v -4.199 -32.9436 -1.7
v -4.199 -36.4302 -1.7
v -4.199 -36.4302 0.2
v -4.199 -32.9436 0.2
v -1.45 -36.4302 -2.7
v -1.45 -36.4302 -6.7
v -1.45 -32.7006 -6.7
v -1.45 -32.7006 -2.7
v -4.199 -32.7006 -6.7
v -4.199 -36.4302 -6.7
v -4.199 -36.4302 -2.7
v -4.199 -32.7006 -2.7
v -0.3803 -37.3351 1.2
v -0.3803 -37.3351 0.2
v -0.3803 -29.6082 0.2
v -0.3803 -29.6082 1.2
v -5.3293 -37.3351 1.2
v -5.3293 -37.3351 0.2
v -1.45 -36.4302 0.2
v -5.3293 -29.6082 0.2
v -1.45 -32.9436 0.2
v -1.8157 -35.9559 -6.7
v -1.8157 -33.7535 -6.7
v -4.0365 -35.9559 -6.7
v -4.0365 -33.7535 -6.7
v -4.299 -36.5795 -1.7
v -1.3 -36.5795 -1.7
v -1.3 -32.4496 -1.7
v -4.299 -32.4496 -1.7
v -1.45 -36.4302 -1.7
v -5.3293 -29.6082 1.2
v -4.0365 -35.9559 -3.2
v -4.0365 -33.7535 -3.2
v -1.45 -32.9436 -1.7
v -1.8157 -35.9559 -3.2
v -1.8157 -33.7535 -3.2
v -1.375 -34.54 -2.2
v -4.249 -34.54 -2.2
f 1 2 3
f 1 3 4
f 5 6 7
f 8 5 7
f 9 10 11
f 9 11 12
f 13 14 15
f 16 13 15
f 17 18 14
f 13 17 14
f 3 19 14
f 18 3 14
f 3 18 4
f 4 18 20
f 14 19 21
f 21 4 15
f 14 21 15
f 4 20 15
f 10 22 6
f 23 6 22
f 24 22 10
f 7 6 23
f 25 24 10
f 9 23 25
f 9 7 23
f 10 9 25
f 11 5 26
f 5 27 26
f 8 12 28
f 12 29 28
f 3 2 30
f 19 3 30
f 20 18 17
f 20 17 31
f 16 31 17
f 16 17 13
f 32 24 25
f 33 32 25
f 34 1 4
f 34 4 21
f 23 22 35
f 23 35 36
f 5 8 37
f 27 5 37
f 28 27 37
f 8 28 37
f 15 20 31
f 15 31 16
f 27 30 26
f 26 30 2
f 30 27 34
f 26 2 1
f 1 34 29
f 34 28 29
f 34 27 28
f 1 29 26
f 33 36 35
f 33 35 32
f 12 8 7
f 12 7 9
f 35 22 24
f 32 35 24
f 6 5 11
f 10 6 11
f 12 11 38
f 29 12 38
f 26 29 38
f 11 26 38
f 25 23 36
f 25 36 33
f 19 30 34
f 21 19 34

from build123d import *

# Parameters (mm, degrees)
EXTRUDE_1_DEPTH      = 0.2
EXTRUDE_1_DEPTH_BACK = 1.7
SKETCH_2_W           = 2.749
SKETCH_2_H           = 3.486646178
SKETCH_3_W           = 4.948986656
SKETCH_3_H           = 7.726872963
EXTRUDE_2_DEPTH      = 1
SKETCH_8_W           = 2.749
SKETCH_8_H           = 3.729608675
EXTRUDE_3_DEPTH      = 4
SKETCH_9_W           = 2.220876602
SKETCH_9_H           = 2.202369297
CUT_EXTRUDE_1_DEPTH  = 3.5


with BuildPart() as part:
    # 草图2 → 凸台-拉伸1 (new, two sides: drawn at the far end of the back side and taken through both)
    with BuildSketch(Plane.XY.offset(-EXTRUDE_1_DEPTH_BACK)):
        with Locations((-2.824500159, -34.686907223)):
            Rectangle(SKETCH_2_W, SKETCH_2_H)
    extrude(amount=EXTRUDE_1_DEPTH + EXTRUDE_1_DEPTH_BACK)

    # 草图3 → 凸台-拉伸2 (add)
    with BuildSketch(Plane.XY.offset(0.2)):
        with Locations((-2.854795759, -33.471663218)):
            Rectangle(SKETCH_3_W, SKETCH_3_H)
    extrude(amount=EXTRUDE_2_DEPTH)

    # 放样1: read off the stored shape, not the designer's step
    # 放样1: loft between two sections, ruled curve by curve
    loft_1_from = [
        Edge.make_line((-1.450000159, -32.700621637, -2.7), (-1.450000159, -36.430230312, -2.7)),
        Edge.make_line((-1.450000159, -36.430230312, -2.7), (-4.199000159, -36.430230312, -2.7)),
        Edge.make_line((-4.199000159, -36.430230312, -2.7), (-4.199000159, -32.700621637, -2.7)),
        Edge.make_line((-4.199000159, -32.700621637, -2.7), (-1.450000159, -32.700621637, -2.7)),
    ]
    loft_1_to = [
        Edge.make_line((-1.300000159, -32.449611662, -1.7), (-1.300000159, -36.579532352, -1.7)),
        Edge.make_line((-1.300000159, -36.579532352, -1.7), (-4.299000159, -36.579532352, -1.7)),
        Edge.make_line((-4.299000159, -36.579532352, -1.7), (-4.299000159, -32.449611662, -1.7)),
        Edge.make_line((-4.299000159, -32.449611662, -1.7), (-1.300000159, -32.449611662, -1.7)),
    ]
    loft_1 = Solid(Shell([*[Face.make_surface_from_curves(loft_1_from[k], loft_1_to[k]) for k in range(4)], Face(Wire(loft_1_from)), Face(Wire(loft_1_to))]))
    add(loft_1)

    # 草图8 → 凸台-拉伸3 (add)
    with BuildSketch(Plane(origin=(0, 0, -2.7), x_dir=(-1, 0, 0), z_dir=(0, 0, -1))):
        with Locations((2.824500159, -34.565425975)):
            Rectangle(SKETCH_8_W, SKETCH_8_H)
    extrude(amount=EXTRUDE_3_DEPTH)

    # 草图9 → 切除-拉伸1 (cut)
    with BuildSketch(Plane(origin=(0, 0, -6.7), x_dir=(-1, 0, 0), z_dir=(0, 0, -1))):
        with Locations((2.92610545, -34.854711182)):
            Rectangle(SKETCH_9_W, SKETCH_9_H)
    extrude(amount=-CUT_EXTRUDE_1_DEPTH, mode=Mode.SUBTRACT)


solid = part.part
